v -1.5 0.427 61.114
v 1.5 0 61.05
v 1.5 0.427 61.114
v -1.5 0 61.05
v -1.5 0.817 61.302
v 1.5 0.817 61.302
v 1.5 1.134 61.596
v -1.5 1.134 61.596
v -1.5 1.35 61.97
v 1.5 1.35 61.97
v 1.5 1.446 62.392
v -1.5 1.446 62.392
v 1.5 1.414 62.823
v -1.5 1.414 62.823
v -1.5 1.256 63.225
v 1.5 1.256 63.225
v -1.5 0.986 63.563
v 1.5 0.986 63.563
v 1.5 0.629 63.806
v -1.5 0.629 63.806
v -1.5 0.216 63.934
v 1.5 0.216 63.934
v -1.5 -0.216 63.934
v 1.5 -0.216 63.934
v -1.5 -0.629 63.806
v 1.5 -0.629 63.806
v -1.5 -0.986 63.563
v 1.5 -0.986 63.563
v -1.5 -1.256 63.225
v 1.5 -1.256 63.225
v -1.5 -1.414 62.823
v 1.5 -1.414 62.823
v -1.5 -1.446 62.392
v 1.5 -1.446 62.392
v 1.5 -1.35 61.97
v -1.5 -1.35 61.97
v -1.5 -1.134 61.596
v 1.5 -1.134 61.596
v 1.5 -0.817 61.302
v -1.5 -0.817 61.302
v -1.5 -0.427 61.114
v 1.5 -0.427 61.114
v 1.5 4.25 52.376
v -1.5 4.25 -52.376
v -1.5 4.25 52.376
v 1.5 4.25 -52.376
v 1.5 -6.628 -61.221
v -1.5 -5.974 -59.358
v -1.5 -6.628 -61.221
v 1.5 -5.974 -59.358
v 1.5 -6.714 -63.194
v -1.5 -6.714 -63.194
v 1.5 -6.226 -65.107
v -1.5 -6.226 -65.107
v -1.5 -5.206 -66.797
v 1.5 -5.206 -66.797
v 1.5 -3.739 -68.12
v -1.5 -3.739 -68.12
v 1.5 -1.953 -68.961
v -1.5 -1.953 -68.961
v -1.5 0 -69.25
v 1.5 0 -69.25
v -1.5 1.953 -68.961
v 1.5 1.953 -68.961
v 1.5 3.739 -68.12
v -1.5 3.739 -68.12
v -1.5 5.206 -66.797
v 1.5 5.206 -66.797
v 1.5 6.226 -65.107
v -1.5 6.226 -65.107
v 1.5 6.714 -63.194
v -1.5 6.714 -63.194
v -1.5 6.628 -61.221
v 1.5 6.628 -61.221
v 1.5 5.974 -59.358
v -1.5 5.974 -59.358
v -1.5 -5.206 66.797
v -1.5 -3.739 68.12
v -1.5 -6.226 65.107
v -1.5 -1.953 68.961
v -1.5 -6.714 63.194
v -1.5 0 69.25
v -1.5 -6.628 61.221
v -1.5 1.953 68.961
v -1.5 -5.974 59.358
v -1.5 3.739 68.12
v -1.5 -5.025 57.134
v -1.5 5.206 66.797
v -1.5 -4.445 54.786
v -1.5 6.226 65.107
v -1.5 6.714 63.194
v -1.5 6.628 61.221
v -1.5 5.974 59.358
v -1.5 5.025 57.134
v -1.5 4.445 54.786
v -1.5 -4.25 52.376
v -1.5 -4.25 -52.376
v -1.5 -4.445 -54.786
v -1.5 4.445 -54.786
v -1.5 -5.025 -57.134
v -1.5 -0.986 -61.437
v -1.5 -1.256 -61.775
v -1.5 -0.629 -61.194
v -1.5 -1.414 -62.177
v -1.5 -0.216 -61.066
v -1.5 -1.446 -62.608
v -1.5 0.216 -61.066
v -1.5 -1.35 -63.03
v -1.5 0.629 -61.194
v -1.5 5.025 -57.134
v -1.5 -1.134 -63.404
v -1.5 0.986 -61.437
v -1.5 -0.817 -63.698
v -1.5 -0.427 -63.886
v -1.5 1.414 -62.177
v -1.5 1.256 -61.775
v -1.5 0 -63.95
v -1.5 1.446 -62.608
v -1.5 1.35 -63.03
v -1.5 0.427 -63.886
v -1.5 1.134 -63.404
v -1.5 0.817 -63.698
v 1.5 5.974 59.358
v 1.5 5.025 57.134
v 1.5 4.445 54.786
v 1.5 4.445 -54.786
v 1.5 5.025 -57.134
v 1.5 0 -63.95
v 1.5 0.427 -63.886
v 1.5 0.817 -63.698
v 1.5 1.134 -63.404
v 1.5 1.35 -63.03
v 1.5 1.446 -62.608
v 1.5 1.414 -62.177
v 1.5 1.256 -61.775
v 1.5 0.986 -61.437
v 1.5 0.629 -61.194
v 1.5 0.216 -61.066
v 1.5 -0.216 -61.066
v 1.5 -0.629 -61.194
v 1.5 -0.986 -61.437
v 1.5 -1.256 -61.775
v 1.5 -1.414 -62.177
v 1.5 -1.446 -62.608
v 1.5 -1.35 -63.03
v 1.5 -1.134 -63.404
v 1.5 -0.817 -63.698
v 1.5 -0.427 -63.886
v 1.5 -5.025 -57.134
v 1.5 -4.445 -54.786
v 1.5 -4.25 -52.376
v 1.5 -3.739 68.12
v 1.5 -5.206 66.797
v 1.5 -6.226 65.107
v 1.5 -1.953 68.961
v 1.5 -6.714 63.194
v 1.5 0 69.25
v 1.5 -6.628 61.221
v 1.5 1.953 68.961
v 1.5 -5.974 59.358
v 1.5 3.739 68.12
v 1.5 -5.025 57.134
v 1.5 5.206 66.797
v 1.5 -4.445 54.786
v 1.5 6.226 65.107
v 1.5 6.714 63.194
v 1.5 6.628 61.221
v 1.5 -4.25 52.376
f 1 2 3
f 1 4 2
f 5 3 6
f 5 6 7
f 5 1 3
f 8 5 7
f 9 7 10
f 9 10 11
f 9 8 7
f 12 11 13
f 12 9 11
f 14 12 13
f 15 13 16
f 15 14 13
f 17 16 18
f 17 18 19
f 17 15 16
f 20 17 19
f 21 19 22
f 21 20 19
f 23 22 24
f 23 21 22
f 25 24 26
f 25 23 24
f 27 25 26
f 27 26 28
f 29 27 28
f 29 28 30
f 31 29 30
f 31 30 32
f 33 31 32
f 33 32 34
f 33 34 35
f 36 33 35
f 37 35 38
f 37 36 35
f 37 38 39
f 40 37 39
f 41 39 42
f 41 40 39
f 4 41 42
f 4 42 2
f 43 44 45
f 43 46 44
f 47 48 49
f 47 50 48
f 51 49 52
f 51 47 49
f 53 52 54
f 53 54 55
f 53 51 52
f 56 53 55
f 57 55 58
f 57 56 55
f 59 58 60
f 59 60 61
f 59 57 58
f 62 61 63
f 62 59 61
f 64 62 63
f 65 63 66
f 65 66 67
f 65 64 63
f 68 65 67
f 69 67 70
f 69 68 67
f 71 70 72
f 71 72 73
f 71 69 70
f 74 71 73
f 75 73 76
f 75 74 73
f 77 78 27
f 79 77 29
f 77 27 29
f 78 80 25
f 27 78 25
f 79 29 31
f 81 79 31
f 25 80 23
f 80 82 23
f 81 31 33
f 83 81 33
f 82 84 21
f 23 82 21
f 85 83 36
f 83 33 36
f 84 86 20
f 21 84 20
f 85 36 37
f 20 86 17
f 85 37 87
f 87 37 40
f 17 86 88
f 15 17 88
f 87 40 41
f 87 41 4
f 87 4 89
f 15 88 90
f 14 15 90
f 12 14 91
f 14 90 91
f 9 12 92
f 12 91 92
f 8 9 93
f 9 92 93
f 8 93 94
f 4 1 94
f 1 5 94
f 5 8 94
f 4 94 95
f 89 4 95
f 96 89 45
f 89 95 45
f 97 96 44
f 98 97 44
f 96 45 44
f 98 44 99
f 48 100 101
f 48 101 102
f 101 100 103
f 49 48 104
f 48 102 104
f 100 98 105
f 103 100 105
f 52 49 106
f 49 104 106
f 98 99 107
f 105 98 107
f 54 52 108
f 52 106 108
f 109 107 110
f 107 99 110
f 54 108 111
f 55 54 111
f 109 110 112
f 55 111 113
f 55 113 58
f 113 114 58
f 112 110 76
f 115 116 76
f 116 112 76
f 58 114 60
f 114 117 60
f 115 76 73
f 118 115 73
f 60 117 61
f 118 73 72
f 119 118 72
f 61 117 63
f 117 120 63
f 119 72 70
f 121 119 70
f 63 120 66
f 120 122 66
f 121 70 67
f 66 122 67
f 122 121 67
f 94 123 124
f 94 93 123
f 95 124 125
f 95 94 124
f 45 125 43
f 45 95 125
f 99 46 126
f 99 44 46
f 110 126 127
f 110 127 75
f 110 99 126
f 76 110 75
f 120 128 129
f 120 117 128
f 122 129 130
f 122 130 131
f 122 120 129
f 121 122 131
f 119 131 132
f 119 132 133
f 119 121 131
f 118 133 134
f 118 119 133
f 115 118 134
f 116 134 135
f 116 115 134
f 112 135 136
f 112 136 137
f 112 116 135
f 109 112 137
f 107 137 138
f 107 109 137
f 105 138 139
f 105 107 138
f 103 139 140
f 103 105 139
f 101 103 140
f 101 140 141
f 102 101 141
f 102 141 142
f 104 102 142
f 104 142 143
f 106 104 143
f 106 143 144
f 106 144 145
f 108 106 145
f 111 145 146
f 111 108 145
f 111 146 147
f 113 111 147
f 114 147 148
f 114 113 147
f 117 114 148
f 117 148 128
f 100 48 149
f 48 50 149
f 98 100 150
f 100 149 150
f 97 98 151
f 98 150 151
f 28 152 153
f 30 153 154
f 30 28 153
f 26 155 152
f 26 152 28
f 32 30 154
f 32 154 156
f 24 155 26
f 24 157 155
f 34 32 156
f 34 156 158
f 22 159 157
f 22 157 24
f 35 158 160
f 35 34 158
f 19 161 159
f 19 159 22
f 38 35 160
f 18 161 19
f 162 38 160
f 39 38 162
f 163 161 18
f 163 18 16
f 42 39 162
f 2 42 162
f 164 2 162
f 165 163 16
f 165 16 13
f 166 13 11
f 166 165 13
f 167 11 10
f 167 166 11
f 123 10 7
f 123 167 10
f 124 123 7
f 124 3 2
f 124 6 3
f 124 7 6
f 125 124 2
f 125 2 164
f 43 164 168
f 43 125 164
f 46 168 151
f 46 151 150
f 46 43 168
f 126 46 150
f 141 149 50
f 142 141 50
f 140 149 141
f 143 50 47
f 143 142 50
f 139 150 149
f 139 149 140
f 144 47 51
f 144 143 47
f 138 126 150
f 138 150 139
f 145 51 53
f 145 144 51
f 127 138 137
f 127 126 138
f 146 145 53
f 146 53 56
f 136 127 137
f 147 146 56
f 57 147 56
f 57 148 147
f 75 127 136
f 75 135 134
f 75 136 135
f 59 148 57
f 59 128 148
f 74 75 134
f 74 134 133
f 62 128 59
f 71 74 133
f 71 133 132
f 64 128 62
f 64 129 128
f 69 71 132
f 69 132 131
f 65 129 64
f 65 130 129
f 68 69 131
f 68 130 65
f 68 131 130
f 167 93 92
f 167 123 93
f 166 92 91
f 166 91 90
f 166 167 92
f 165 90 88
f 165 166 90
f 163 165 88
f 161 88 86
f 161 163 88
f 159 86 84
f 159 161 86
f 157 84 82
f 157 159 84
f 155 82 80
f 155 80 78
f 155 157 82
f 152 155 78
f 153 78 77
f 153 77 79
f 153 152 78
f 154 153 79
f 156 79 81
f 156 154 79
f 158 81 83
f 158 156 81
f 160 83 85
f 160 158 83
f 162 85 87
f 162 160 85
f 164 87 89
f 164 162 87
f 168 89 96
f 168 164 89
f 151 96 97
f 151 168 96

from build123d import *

# Parameters (mm, degrees)
SKETCH1_R           = 6.75
SKETCH1_R_2         = 1.45
BOSS_EXTRUDE1_DEPTH = 1.5
FILLET1_R           = 15


with BuildPart() as part:
    # Sketch1 → Boss-Extrude1 (new body, symmetric)
    with BuildSketch(Plane(origin=(0, 0, 0), x_dir=(0, 0, -1), z_dir=(1, 0, 0))):
        with Locations((-62.5, 0)):
            Circle(SKETCH1_R)
        with Locations((-62.5, 0)):
            Circle(SKETCH1_R_2, mode=Mode.SUBTRACT)
        with BuildLine():
            Line((-57.255955759, -4.25), (57.255955759, -4.25))
            ThreePointArc((57.255955759, -4.25), (55.75, 0), (57.255955759, 4.25))
            Line((57.255955759, 4.25), (-57.255955759, 4.25))
            ThreePointArc((-57.255955759, 4.25), (-56.137618424, 2.254462394), (-55.75, 0))
            ThreePointArc((-55.75, 0), (-56.137618424, -2.254462394), (-57.255955759, -4.25))
        make_face()
        with Locations((62.5, 0)):
            Circle(SKETCH1_R)
        with Locations((62.5, 0)):
            Circle(SKETCH1_R_2, mode=Mode.SUBTRACT)
    extrude(amount=BOSS_EXTRUDE1_DEPTH, both=True)

    # Fillet1
    fillet1_edges = [part.edges().sort_by_distance(p)[0] for p in [
        (0, 4.25, -57.255955759),
        (0, -4.25, -57.255955759),
        (0, -4.25, 57.255955759),
        (0, 4.25, 57.255955759),
    ]]
    fillet(fillet1_edges, radius=FILLET1_R)


solid = part.part
